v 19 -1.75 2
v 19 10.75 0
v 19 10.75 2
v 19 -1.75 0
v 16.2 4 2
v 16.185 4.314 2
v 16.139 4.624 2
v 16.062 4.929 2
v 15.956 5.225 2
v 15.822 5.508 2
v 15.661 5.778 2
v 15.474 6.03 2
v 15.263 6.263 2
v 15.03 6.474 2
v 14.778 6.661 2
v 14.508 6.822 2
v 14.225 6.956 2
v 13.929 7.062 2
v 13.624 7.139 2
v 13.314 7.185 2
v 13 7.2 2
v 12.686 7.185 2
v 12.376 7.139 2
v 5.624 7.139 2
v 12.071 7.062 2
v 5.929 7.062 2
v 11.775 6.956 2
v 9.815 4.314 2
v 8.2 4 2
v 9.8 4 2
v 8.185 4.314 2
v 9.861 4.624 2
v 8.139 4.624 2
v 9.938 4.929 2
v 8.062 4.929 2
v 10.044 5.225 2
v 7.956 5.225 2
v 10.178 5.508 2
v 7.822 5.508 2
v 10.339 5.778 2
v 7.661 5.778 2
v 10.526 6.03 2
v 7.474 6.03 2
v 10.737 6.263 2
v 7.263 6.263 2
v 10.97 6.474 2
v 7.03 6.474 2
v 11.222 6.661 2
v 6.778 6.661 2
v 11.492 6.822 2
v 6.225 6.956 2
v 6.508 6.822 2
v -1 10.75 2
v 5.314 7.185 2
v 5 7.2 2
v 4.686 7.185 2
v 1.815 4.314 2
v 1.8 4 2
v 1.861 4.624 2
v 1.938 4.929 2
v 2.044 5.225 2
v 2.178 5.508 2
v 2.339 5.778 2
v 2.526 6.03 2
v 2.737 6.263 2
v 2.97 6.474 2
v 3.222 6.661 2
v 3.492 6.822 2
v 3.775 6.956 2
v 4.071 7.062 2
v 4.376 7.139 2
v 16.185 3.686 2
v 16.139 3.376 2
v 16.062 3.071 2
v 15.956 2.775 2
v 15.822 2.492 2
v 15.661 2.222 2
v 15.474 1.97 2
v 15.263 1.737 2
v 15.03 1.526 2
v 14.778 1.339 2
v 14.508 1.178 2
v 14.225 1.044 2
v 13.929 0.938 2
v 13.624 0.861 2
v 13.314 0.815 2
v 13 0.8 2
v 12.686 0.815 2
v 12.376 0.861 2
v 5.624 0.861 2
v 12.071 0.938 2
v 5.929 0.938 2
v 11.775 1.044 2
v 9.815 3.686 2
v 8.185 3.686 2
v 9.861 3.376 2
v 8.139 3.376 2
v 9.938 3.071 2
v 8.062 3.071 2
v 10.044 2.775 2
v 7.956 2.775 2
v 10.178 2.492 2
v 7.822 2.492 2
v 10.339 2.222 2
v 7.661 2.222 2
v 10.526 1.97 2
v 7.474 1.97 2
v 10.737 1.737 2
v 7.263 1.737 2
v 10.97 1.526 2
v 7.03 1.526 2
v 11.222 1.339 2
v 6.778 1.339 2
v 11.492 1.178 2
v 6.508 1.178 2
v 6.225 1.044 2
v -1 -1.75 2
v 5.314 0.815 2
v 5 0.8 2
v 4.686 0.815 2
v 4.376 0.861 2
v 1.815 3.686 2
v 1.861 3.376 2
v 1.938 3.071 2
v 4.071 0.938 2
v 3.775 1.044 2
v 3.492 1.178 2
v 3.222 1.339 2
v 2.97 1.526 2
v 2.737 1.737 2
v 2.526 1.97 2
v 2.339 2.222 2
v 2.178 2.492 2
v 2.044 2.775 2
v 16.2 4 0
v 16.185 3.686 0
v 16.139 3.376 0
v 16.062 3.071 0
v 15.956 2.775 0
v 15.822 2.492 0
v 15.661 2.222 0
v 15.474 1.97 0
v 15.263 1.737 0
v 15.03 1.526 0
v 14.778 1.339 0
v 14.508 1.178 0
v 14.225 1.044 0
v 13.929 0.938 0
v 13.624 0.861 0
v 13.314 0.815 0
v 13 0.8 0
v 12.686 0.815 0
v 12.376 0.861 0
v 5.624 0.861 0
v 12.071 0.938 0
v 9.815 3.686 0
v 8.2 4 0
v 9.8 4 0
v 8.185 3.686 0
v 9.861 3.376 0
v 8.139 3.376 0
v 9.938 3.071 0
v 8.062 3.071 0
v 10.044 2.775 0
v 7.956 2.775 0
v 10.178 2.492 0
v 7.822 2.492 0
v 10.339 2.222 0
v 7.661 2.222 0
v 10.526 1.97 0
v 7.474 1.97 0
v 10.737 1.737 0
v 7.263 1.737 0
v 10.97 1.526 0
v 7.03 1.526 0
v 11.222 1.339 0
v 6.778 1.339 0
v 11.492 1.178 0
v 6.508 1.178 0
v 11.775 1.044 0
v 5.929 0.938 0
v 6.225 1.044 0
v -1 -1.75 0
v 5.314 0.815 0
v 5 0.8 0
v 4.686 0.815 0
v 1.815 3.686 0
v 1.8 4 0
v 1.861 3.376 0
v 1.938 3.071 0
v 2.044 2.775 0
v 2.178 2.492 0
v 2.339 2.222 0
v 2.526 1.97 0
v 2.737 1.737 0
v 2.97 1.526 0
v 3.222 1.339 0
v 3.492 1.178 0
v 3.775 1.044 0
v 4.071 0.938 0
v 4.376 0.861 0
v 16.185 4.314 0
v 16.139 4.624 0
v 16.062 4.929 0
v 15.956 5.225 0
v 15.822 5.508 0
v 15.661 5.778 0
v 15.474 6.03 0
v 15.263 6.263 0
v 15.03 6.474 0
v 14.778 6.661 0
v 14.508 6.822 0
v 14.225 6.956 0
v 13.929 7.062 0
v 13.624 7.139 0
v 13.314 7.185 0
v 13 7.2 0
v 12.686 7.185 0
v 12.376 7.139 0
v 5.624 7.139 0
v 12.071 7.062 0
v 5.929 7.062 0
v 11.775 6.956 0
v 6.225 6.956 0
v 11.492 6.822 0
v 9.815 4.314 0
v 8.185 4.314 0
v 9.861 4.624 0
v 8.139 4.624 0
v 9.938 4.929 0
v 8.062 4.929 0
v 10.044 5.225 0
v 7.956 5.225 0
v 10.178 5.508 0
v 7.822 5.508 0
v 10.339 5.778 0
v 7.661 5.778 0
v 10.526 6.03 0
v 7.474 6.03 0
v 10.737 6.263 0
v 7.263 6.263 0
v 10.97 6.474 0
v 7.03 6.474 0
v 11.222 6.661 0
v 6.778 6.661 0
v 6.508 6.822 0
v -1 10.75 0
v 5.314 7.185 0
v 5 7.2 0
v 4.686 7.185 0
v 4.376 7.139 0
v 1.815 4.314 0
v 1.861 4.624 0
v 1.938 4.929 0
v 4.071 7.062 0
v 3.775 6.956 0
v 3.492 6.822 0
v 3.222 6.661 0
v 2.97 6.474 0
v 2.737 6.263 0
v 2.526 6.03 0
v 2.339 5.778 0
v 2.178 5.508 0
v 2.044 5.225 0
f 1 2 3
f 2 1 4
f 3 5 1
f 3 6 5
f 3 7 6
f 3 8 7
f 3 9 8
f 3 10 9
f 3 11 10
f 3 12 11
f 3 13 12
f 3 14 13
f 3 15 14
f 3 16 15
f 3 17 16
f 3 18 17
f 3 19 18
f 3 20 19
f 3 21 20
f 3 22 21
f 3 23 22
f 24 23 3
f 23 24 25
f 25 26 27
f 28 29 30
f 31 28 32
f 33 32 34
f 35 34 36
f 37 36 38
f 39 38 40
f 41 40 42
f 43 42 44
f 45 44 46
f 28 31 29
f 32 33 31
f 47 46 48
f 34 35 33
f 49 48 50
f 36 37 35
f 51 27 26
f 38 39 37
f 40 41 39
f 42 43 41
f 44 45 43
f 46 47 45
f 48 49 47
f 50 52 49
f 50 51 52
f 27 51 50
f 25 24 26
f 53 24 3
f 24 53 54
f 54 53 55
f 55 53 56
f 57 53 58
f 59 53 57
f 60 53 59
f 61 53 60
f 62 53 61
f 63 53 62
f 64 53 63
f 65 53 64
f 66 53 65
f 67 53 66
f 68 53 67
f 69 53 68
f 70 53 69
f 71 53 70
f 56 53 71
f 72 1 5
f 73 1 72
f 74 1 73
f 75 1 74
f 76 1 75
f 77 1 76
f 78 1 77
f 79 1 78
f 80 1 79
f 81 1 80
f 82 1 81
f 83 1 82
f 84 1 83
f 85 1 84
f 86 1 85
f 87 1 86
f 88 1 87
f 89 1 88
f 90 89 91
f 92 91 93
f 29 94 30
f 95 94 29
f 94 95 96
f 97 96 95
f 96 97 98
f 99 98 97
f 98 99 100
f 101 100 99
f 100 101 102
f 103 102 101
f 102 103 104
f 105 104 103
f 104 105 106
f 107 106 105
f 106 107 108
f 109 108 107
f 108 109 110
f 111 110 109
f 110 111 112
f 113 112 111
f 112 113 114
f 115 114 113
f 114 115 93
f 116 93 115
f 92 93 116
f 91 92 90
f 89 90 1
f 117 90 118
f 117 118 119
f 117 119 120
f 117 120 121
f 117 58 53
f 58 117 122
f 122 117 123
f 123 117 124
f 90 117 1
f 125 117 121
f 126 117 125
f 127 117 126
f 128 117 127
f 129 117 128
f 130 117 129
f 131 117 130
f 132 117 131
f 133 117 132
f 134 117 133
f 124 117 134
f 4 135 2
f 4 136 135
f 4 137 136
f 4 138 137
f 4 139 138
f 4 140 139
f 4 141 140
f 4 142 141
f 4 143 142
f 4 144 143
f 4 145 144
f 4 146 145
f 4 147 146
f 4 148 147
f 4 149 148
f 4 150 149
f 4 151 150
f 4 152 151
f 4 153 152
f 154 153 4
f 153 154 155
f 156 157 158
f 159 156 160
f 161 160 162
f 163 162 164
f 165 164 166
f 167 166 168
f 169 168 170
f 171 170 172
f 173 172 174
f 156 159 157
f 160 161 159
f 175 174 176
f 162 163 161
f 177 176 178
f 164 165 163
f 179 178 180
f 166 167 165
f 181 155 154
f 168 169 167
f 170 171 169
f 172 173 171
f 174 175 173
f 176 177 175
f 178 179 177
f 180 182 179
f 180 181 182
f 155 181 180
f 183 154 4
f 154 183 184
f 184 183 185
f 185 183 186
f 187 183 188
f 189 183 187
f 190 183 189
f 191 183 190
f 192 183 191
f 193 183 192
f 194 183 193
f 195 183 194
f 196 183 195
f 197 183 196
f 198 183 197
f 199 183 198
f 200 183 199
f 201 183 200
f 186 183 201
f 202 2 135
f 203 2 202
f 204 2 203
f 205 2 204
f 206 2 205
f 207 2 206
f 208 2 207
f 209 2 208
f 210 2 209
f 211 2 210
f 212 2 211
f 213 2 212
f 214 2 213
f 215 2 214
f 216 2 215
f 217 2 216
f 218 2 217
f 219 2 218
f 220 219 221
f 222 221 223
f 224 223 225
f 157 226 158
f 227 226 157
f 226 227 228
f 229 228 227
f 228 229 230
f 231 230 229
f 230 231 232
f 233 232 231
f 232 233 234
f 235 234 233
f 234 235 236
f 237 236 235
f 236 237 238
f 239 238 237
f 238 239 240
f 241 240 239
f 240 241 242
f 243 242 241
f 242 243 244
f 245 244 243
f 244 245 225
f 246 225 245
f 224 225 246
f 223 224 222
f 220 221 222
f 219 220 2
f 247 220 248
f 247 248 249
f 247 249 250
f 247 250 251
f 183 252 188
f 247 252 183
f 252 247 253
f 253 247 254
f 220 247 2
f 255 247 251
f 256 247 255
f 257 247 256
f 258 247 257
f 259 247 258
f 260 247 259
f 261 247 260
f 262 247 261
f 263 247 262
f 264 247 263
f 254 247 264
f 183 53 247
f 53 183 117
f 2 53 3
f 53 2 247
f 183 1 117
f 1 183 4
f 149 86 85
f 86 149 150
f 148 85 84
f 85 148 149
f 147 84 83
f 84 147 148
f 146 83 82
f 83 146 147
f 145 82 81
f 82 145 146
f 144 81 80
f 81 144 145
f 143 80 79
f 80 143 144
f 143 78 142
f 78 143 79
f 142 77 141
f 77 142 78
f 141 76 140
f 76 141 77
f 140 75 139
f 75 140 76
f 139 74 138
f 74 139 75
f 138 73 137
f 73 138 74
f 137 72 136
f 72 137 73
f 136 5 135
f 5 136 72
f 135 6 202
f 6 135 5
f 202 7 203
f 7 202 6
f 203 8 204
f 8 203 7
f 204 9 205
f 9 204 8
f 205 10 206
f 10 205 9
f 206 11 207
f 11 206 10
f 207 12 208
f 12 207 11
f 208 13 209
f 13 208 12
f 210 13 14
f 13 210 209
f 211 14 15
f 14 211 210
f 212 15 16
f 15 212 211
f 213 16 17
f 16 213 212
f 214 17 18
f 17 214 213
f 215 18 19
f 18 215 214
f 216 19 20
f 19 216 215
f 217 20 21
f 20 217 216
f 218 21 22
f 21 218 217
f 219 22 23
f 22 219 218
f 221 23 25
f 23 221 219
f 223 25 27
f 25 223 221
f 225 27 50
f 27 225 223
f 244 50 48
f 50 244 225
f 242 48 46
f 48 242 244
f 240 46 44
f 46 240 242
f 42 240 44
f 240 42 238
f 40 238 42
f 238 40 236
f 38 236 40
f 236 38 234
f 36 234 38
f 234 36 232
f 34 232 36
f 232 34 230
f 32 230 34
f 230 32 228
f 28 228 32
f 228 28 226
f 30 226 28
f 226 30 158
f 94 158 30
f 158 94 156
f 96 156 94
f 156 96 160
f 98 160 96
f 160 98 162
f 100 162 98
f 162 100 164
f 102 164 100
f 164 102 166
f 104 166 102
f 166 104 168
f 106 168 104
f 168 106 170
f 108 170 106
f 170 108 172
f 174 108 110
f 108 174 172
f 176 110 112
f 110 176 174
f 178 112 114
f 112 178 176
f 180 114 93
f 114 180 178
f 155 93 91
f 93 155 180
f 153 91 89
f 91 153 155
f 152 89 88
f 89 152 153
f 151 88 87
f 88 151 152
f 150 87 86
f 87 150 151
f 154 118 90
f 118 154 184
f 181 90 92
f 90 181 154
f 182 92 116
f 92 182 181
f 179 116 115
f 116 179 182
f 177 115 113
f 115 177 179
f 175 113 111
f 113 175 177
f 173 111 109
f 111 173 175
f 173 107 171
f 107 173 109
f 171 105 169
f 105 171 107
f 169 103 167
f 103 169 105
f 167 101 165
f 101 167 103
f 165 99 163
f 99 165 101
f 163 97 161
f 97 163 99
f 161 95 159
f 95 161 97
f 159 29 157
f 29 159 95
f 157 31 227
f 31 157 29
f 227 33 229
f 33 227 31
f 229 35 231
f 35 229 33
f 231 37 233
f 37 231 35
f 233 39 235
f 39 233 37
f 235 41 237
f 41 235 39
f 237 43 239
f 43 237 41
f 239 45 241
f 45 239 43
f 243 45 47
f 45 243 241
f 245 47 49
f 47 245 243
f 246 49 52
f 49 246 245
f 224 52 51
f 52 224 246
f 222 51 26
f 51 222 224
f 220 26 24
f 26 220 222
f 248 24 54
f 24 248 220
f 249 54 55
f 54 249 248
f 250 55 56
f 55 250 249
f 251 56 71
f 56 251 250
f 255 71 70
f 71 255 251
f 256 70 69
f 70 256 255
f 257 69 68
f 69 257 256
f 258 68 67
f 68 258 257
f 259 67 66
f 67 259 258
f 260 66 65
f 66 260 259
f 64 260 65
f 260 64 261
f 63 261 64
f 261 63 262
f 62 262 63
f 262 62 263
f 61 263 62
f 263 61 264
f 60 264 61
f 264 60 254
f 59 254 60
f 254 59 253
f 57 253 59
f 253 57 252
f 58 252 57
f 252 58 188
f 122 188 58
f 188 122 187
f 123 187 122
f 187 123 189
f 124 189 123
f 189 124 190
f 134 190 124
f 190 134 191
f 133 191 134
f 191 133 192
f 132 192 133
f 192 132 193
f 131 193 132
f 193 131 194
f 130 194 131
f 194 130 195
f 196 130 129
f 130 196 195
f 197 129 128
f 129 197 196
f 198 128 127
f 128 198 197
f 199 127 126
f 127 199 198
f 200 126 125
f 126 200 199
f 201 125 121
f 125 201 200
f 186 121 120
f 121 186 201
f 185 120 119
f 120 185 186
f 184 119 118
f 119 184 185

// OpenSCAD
// Generated by SolidPython 1.1.3 on 2022-12-12 15:48:57


difference() {
	translate(v = [-0.0000000000, -0.0000000000]) {
		translate(v = [9.0000000000, 4.5000000000]) {
			translate(v = [0, 0, 1.0000000000]) {
				cube(center = true, size = [20, 12.5000000000, 2]);
			}
		}
	}
	linear_extrude(height = 2) {
		union() {
			translate(v = [0, 0]) {
				union() {
					translate(v = [0, 0]) {
						union() {
							translate(v = [9.0000000000, 4.0000000000, 0]) {
								rotate(a = 0) {
									union() {
										translate(v = [4, 0]) {
											circle($fn = 64, r = 3.2000000000);
										}
										translate(v = [-4, 0]) {
											circle($fn = 64, r = 3.2000000000);
										}
									}
								}
							}
						}
					}
				}
			}
		}
	}
}
/***********************************************
*********      SolidPython code:      **********
************************************************
 
import solid
import pudb
from solid.utils import *
import viewscad
import subprocess
import os
import os.path as osp
import math

chamfer_extrude=solid.import_scad("./chamfer_extrude.scad")
chamfer_extrude=chamfer_extrude.chamfer_extrude
r = viewscad.Renderer(width=800, height=800)

def debug(model,f_name,path="/home/ts/code/projects/mfd/designs/debug"):
    solid.scad_render_to_file(model,osp.join(path,f_name)+".scad")
#generate position list of wells using offset from center
wells_pos_from_center_4 = lambda offset: [[-offset,offset],
                                        [offset, offset],
                                        [-offset, -offset],
                                        [offset, -offset]]
#wells_pos_from_center_2 = lambda offset: [[0,offset],
#                                        [0, -offset]]
wells_pos_from_center_2 = lambda offset: [[offset,0],
                                        [-offset,0]]

def wells_top_bottom(radius,height=None, positions = None, dxf = False):
    if positions is None:
        offset = radius+radius/2.0
        positions = wells_pos_from_center_2(offset)
    if dxf or (height is None):
        height = 0
    wells = []
    for position in positions:
        #make circle if making dxf
        if dxf:
            well_shape = solid.circle(r=radius, segments=64)
            well_shape = solid.translate([position[0],position[1]])(well_shape)
        #if stl make cylinder
        else:
            well_shape = solid.cylinder(r=radius, h=height, segments=64, center = True)
            well_shape = solid.translate([position[0],position[1],height/2.0])(well_shape)
        wells.append(well_shape)
    return  union()(*wells)

#place wells in four corners 
def four_corner(radius,height=None, positions = None, dxf = False):
    #if well pos not specified set
    #to equally spaced by half radius
    if positions is None:
        offset = radius+radius/2.0
        positions = wells_pos_from_center_4(offset)
    if dxf or (height is None):
        height = 0
    #make wells at positions with specified radius and height
    wells = []
    for position in positions:
        #make circle if making dxf
        if dxf:
            well_shape = solid.circle(r=radius, segments=64)
            well_shape = solid.translate([position[0],position[1]])(well_shape)
        #if stl make cylinder
        else:
            well_shape = solid.cylinder(r=radius, h=height, segments=64, center = True)
            well_shape = solid.translate([position[0],position[1],height/2.0])(well_shape)
        wells.append(well_shape)
    return  union()(*wells)

#generate channels 
def make_channels(length,width,height=0,num_chans=1,max_chans=None,spacing=None, dxf = False,
                  rotate_channels=False):
    if dxf or (height is None):
        height = 0
    #if channel gap not defined, is equal to
    if spacing is None: spacing = width
    #calculate number of channels if fitting max num within given width
    if not max_chans is None:
        import math
        num_chans = math.floor((max_chans-spacing)/(width+spacing))
    #get total width of channel section  
    total_width = (width*num_chans)+(spacing*(num_chans-1))

    #make template channel
    #if rotate_channels: width, length = length, width
    if dxf:
        channel_t = solid.square([length,width],center = True)
    else:
        channel_t = solid.cube([length,width,height], center = True)

    #if number channels is even, offset the first channel to center its gap
    if num_chans % 2 == 0: centering = -(width/2.0+spacing/2.0)
    else: centering = 0
    #move template channel up to align bottom at z = 0 
    #and offset center if necessary
    if dxf:
        channel_t = solid.translate([0,centering])(channel_t)
    else:
        channel_t = solid.translate([0,centering,height/2.0])(channel_t)

    #if rotate_channels: length,width = width,length
    #start making the channels
    channels = []
    for i in range(num_chans):
        #if i=0 there is no translation
        #if i=1, we make the first channel adjacent to second
        direction = i

        #if i>=1, we add channels alternating left and right
        if i >= 1:
            direction = -(i/2.0)
            if i % 2 == 1: direction = (-direction)+0.5
                
        #make channel at right position and add it to channel list
        translation_coords = [0,direction*(width+spacing)]
        #if rotate_channels: translation_coords = [direction*(width+spacing),0]
        if dxf:
            channel = solid.translate(translation_coords)(channel_t)
        else:
            channel = solid.translate([*translation_coords,0])(channel_t)
        channels.append(channel)
    
    #group all channels as one object
    channels = union()(*channels)
    #compute the x,y,z dimensions in order to pass as arguments 
    #for construction of other parts of device (such as the chambers)
    measurements = {'x':(length/2.0,-length/2.0),
                    'y':(total_width/2.0,-total_width/2.0)}
    if not dxf:
        measurements['z'] = (height,0)
    if rotate_channels:
        channels = solid.rotate(90)(channels)
        measurements['x'],measurements['y']=measurements['y'],measurements['x']
    return channels,measurements

def make_chambers(msrs,height=None,extra=0,len_until=None,width=None, dxf = False):
    #computes x,y,z length
    total = lambda x : abs(x[0]) + abs(x[1])
    
    #if specific height if specified
    #otherwise use same height as channels
    if dxf:
        pass
    elif not height is None:
        msrs['z'] = (height,0)
    else:
        msrs['z'] = (0,0)
        
    #make copy of measurements from channels to modify chamber dimensions 
    #and add length to chambers as specified
    chamber_dims = msrs.copy()
    #calculate length of chamber to reach specified offset
    if not len_until is None:
        chamber_len = len_until-(msrs['x'][0])
    #or add specified length to channel length (if not specified, adds 0)
    else:
        chamber_len = msrs['x'][0]+extra
    #set the chamber length based 
    chamber_dims['x'] = (chamber_len/2.0,-(chamber_len/2.0))
    #compute final dimensions of chamber
    if not width is None:
        chamber_dims['y'] = (width/2.0,-width/2.0)
    chamber_dims = [total(size) for size in chamber_dims.values()]
        
    #calculate chamber translation offset to place adjacent to channels
    chamber_trslt = msrs['x'][0]+(chamber_len/2.0)
    #compute chamber translation coordinates to align with channels
    #x = 1 moves chamber above channels
    #x = -1 moves chamber below channels
    if dxf:
        trslt = lambda x : [x*(chamber_trslt),0]
    else:
        trslt = lambda x : [x*(chamber_trslt),0,msrs['z'][0]/2.0]
    
    #function to make chamber at top or at bottom 
    if dxf:
        move = lambda x : solid.translate(trslt(x))(solid.square(chamber_dims, center = True) )
    else:
        move = lambda x : solid.translate(trslt(x))(solid.cube(chamber_dims,center = True))
    #make top and bottom chambers and return them as grouped
    top = move(1)
    bottom = move(-1)
    #chambers=solid.rotate(90)(solid.union()(top,bottom))
    chambers=(solid.union()(top,bottom))

    return chambers

#create alignment features 
def alignment_features(unit,dims,grid_size, mask_size = None, alignment = "hollow", units_from_center = (2.5,2.5), corner_len=None):
    width = grid_size[0]*dims[0]
    length = grid_size[1]*dims[1]
    if mask_size is None and corner_len is None:
        corner_len = (dims[0] + dims[1]) /2 / 8
    corner = lambda thickness_div : solid.union()( solid.square([corner_len,corner_len/thickness_div],center=False), solid.square([corner_len/thickness_div,corner_len],center=False) )
    
    def make_full(thickness_div):
        thickness = corner_len/thickness_div
        tr = solid.translate([0, 0, 0 ])(solid.rotate(180)(corner(thickness_div)))
        tr = solid.translate([thickness/2,thickness/2,0])(tr)
        bl = solid.translate([0, 0, 0 ])(solid.rotate(0)(corner(thickness_div)))
        bl = solid.translate([-thickness/2,-thickness/2,0])(bl)
        return solid.union()(tr,bl)
    
    def make_hollow(thickness_div):
        thickness = corner_len/(thickness_div/2)
        inner = make_full(thickness_div)
        outer = make_full(thickness_div/2)
        hollow = outer - inner 
        return hollow
    
    center = (width /2 , length/2)
    mask_pos = lambda x,y : (center[0] + x*(float(units_from_center[0])*dims[0]), center[1] + y*(float(units_from_center[1])*dims[1]))
    positions = []
    positions.append(mask_pos(1,0))
    positions.append(mask_pos(0,1))
    positions.append(mask_pos(-1,0))
    positions.append(mask_pos(0,-1))
    make_mask = lambda mtype : make_hollow(8) if mtype == "hollow" else make_full(8)
    masks = [ solid.translate([*position,0])(make_mask(alignment)) for position in positions]
    
    solid.scad_render_to_file(solid.union()(*masks),"./designs/open_chamber/masks.scad")
    #return unit - solid.union()(*masks)
    return solid.union()(*masks,unit)

def create_outline(thickness, array, dims, grid_size,):
    width = grid_size[0]*dims[0] + thickness *2
    length = grid_size[1]*dims[1] + thickness *2
    outer = solid.translate([-thickness, -thickness,0])(solid.square([width, length]))
    return outer-array

def create_wall(wall_thickness, outline_thickness, dims, grid_size, wall_height = 2000, dxf = False):
    inner_width = grid_size[0]*dims[0] + outline_thickness *2
    inner_length = grid_size[1]*dims[1] + outline_thickness *2
    outer_width = inner_width + wall_thickness * 2
    outer_length = inner_length + wall_thickness * 2
    outer_pos_x = -outline_thickness-wall_thickness
    outer_pos_y = -outline_thickness-wall_thickness
    inner_pos_x = -outline_thickness
    inner_pos_y = -outline_thickness
    if dxf:
        inner_wall = solid.translate([inner_pos_x,
                                      inner_pos_y,
                                      0])(solid.square([inner_width, inner_length]))
        outer_wall = solid.translate([outer_pos_x,
                                      outer_pos_y,
                                      0])(solid.square([outer_width, outer_length]))

        return outer_wall-inner_wall
    else:
        inner_wall = solid.translate([inner_pos_x,
                                      inner_pos_y,
                                      0])(solid.cube([inner_width, inner_length,wall_height]))
        outer_wall = solid.translate([outer_pos_x,
                                      outer_pos_y,
                                      0])(solid.cube([outer_width, outer_length,wall_height]))

        return outer_wall-inner_wall, {'wall_height': wall_height,
                                       'wall_thickness': wall_thickness,
                                       'inner_width':inner_width,
                                       'inner_length': inner_length,
                                       'outer_width': outer_width,
                                       'outer_length': outer_length,
                                       'outer_pos_x' : outer_pos_x,
                                       'outer_pos_y' : outer_pos_y,
                                       'inner_pos_x' : inner_pos_x,
                                       'inner_pos_y' : inner_pos_y}

def create_thicker_wall(wall_thickness, outer_wall_offset, wall_dims, dims, grid_size, height_start = .2, height_end=2, dxf = False):
    addon_wall,thicker_wall_dims = create_wall(wall_thickness, outer_wall_offset, dims, grid_size, wall_height=height_end-height_start, dxf = False)
    addon_wall = solid.translate([0,0,height_start])(addon_wall)

    thicker_wall_dims['wall_height'] = height_end
    thicker_wall_dims['wall_thickness'] = wall_dims['wall_thickness'] + wall_thickness
    return addon_wall, thicker_wall_dims
 
def add_lock_to_wall(wall,wall_dims,y_offset = 0,cut_ratio=0.7,L_length=3, gap_ratio=0.05, axis="x",width_ratio=1/2):
    # Makes L shape
    def make_L(max_length,length_thickness,max_width,width_thickness,height,y_offset):
        length = solid.cube([max_length,length_thickness,height])
        width = solid.cube([width_thickness,max_width,height])
        width = solid.translate([max_length-(width_thickness),0,0])(width)
        L = solid.union()(width,length)
        debug(L,"L")
        if axis == "x":
            L = solid.rotate(-90)(L)
            L = solid.translate([0,max_length,0])(L)
        else:
            L = solid.rotate(-180)(L)
            L = solid.translate([max_length,max_width,0])(L)
        return solid.translate([0,0,y_offset])(L)
    
    lock_length = L_length
    lock_width = wall_dims['wall_thickness']*width_ratio
    lock_length_thickness = lock_width/2
    lock_width_thickness = lock_width/2
    L_lock = make_L(lock_length,lock_length_thickness,lock_width,lock_width_thickness, wall_dims['wall_height']-y_offset, y_offset)
    
    margin_space = lock_length - lock_length*(1-gap_ratio)
    key_length = lock_length-margin_space
    key_length_thickness = lock_length_thickness-(margin_space*2)
    key_width = lock_width-(margin_space*2)
    key_width_thickness = lock_width_thickness-(margin_space*2)
    L_key = make_L(key_length,key_length_thickness,key_width,key_width_thickness, wall_dims['wall_height']-y_offset, y_offset)
    L_key = solid.translate([margin_space,margin_space,0])(L_key)
    L = solid.union()(L_lock,L_key)
    debug(L,"L")
    
    #Make cube to be used as negative to split frame in a half
    #Can choose if making left or right negative, specify ratio of split
    def make_negative(right,cut_ratio):
        if axis == "x":
            if right:
                length = wall_dims['outer_length']*(1-cut_ratio)
                pos_x = wall_dims['outer_pos_x']+(wall_dims['outer_length']*cut_ratio)
            else:
                length = wall_dims['outer_length']*(cut_ratio)
                pos_x = wall_dims['outer_pos_x'] 
            negative = solid.cube([wall_dims['outer_width'],length, wall_dims['wall_height']])
            negative = solid.translate([wall_dims['outer_pos_y'],pos_x,0])(negative)
        else:
            if right:
                length = wall_dims['outer_width']*(1-cut_ratio)
                pos_x = wall_dims['outer_pos_y']+(wall_dims['outer_width']*cut_ratio)
            else:
                length = wall_dims['outer_width']*(cut_ratio)
                pos_x = wall_dims['outer_pos_y'] 
            negative = solid.cube([length,wall_dims['outer_length'], wall_dims['wall_height']])
            negative = solid.translate([pos_x,wall_dims['outer_pos_x'],0])(negative)
        return negative, pos_x, length 
                      
    #Make negatives
    negative_right, right_half_pos_x, right_half_length = make_negative(True,cut_ratio)
    negative_left, left_half_pos_x, right_half_length = make_negative(False,cut_ratio)
    #Make halves
    left_half = solid.difference()(wall,negative_right)
    right_half = solid.difference()(wall,negative_left)
    def place_L(L, L_length,L_width):
        #Place L on top wall       
        offset_to_center = (wall_dims['wall_thickness']-L_width)/2
        if axis == "x":
            y_pos_top = (wall_dims['outer_pos_y'] +
                    wall_dims['outer_width'] - 
                    L_width - offset_to_center)
            top_L = solid.translate([y_pos_top,
                                     right_half_pos_x-(L_length),
                                     0])(L)
            #Place L on bottom wall       
            y_pos_bottom = wall_dims['outer_pos_y']+offset_to_center
            bottom_L = solid.translate([y_pos_bottom,
                                        right_half_pos_x-L_length,
                                        0])(L)
        else:
            y_pos_top = (wall_dims['outer_pos_x'] +
                    wall_dims['outer_length'] -
                    (L_width+offset_to_center))
            top_L = solid.translate([right_half_pos_x-L_length,
                                     y_pos_top,
                                     0])(L)
            #Place L on bottom wall       
            y_pos_bottom = wall_dims['outer_pos_y']+offset_to_center
            bottom_L = solid.translate([right_half_pos_x-L_length,
                                        y_pos_bottom,
                                        0])(L)
        return bottom_L, top_L
    #Make complimentary L pieces through union and differences
    #Make Lock
    bottom_L_lock, top_L_lock = place_L(L_lock,L_length,lock_width)
    left_half = solid.difference()(left_half,bottom_L_lock)
    left_half = solid.difference()(left_half,top_L_lock)
    #Make Key
    bottom_L_key, top_L_key = place_L(L_key,L_length,lock_width)
    right_half = solid.union()(right_half,bottom_L_key)
    right_half = solid.union()(right_half,top_L_key)
    return left_half, right_half


#build a row x col grid of containment units
def make_unit_array(unit,dims,grid_size, dxf = False, alignment = None, mask_size = None,
                    units_from_center = None,alignment_offset=None, alignment_mark_size=1):
    units = []
    for col in range(grid_size[1]):
        for row in range(grid_size[0]):
            if dxf:
                units.append(solid.translate([row*dims[0],col*dims[1]])(unit))
            else:
                units.append(solid.translate([row*dims[0],col*dims[1],dims[2]/2.0])(unit))
    array = solid.union()(*units)
    if (not alignment is None) and dxf:
        if not alignment_offset is None:
            array = solid.translate([alignment_offset[0],alignment_offset[1]])(array)
        array = alignment_features(array,dims, grid_size, alignment = alignment, mask_size = None, units_from_center = units_from_center,corner_len=alignment_mark_size)
        if not alignment_offset is None:
            array = solid.translate([-alignment_offset[0],-alignment_offset[1]])(array)
    return array


def make_taylor(wells_pos = wells_pos_from_center_4(2.25), well_rad = 1.5 ,
                well_height = 2, chan_w = 0.01, chan_l = 1, chan_h = 0.010 ,
                chan_gap = 0.040, max_chans = None,num_chans=100, chamber_height  = 0.100,
                columns = 1, rows = 1, chamber_len_until=2.25, add_channels = True, add_wells = True, 
                add_chambers = True, save_path = "./", alignment = None, units_from_center = 2,
                mask_size = None, render_stl = False, outline_thickness = 0.050, dxf = True,
                wall_height = 15, wall_thickness = 0.95, casing_x=9, casing_y=9, casing_z=0,rotate_units=0):

    dims = [casing_x, casing_y, casing_z]
    wells = four_corner(well_rad,well_height, dxf = dxf, positions = wells_pos)
    debug(wells,"wells")
    channels, msrs = make_channels(chan_l,chan_w,chan_h,dxf=dxf, spacing = chan_gap, max_chans=max_chans,num_chans=num_chans)
    debug(channels,"channels")
    chambers = make_chambers(msrs,dxf = dxf, height=chamber_height,len_until=chamber_len_until)
    debug(chambers,"chambers")

    #add together and render
    device_parts = []
    if add_channels:
        device_parts.append(channels)
    if add_wells:
        device_parts.append(wells)
    if add_chambers:
        device_parts.append(chambers)
    device=union()(*device_parts)
    device = rotate(rotate_units)(device)

    device=solid.translate([dims[0]/2.0,dims[1]/2.0,0])(device)
    channels = rotate(rotate_units)(channels)
    channels=solid.translate([dims[0]/2,dims[1]/2,0])(channels)
    chambers_wells = union()(wells,chambers)
    chambers_wells = rotate(rotate_units)(chambers_wells)
    chambers_wells=solid.translate([dims[0]/2,dims[1]/2,0])(chambers_wells)

    file_name = str(rows)+'x'+str(columns)+'_units_'
    grid_size = [rows,columns]

    if alignment:
        alignment="full"
    device = make_unit_array(device,dims,grid_size, dxf=dxf, alignment = alignment,
                                 units_from_center = units_from_center)
    channels = make_unit_array(channels,dims,grid_size, dxf=dxf, alignment = alignment,
                                 units_from_center = units_from_center)
    if alignment=="full":
        alignment="hollow"

    chambers_wells = make_unit_array(chambers_wells,dims,grid_size, dxf=dxf, alignment = alignment,
                                 units_from_center =units_from_center)

    def save_model(model,prefix):
        model_fname = os.path.abspath(save_path+prefix+"_"+file_name+".scad")
        solid.scad_render_to_file(model,model_fname)
        return model_fname

    wells_fname = save_model(wells,"wells")
    channels_fname = save_model(channels,"channels")
    device_fname = save_model(device,"device")
    chambers_wells_fname = save_model(chambers_wells,"chambers_wells")
    return (chambers_wells,chambers_wells_fname), (channels,channels_fname), (device,device_fname)

def make_device(design='open',rows=8,columns=6,wells_pos = 4.5, well_rad=3.2,well_height=0.1,
                chan_l=1,chan_w=0.01,chan_h=0.01,chan_gap=0.015,num_chans=101,dxf=True,save_path="./designs/open_chamber/",
                casing_x=9.0,casing_y=18.0,casing_z=0,rotate_units=90,units_from_center=(3,1),chamber_len_until=4.5,
                chamber_width=None,alignment=True, add_wells=True, add_channels=True,add_chambers=True):

    dims = [casing_x, casing_y, casing_z]
    if design == "open":
        wells_pos=wells_pos_from_center_2(wells_pos)
        wells = wells_top_bottom(well_rad,height=well_height, dxf = dxf, positions = wells_pos)
    elif design == "closed":
        wells_pos=wells_pos_from_center_4(wells_pos)
        wells = four_corner(well_rad,well_height, dxf = dxf, positions = wells_pos)
    else:
        print(design+" is not a valid design.\n Choose valid design: 'open' or 'closed'")
        exit()
    wells = rotate(rotate_units)(wells)
    wells=solid.translate([dims[0]/2,dims[1]/2,0])(wells)



    channels, msrs = make_channels(chan_l,chan_w,chan_h,dxf=dxf, spacing = chan_gap, num_chans=num_chans,rotate_channels=False)
    channels = rotate(rotate_units)(channels)
    channels=solid.translate([dims[0]/2,dims[1]/2,0])(channels)

    chambers=make_chambers(msrs,height=None,extra=0,len_until=chamber_len_until, width=chamber_width,dxf = dxf)
    chambers = rotate(rotate_units)(chambers)
    chambers=solid.translate([dims[0]/2,dims[1]/2,0])(chambers)

    device_parts = []
    if add_channels:
        device_parts.append(channels)
    if add_wells:
        device_parts.append(wells)
    if add_chambers:
        device_parts.append(chambers)
    device = union()(*device_parts)
    #device = rotate(rotate_units)(device)
    #device=solid.translate([dims[0]/2.0,dims[1]/2.0,0])(device)

    chambers_wells = []
    if add_chambers:
        chambers_wells.append(chambers)
    if add_wells:
        chambers_wells.append(wells)
    chambers_wells = union()(*chambers_wells)
    #chambers_wells = union()(wells,chambers)
    #chambers_wells = rotate(rotate_units)(chambers_wells)
    #chambers_wells=solid.translate([dims[0]/2,dims[1]/2,0])(chambers_wells)

    file_name = str(rows)+'x'+str(columns)+'_units_'

    grid_size = [rows,columns]
    if alignment:
        alignment="full"
    device = make_unit_array(device,dims,grid_size, dxf=dxf, alignment = alignment,
                                 units_from_center = units_from_center)
    channels = make_unit_array(channels,dims,grid_size, dxf=dxf, alignment = alignment,
                                 units_from_center = units_from_center)
    if alignment=="full":
        alignment="hollow"

    chambers_wells = make_unit_array(chambers_wells,dims,grid_size, dxf=dxf, alignment = alignment,
                                 units_from_center =units_from_center)

    def save_model(model,prefix):
        model_fname = os.path.abspath(save_path+prefix+"_"+file_name+".scad")
        solid.scad_render_to_file(model,model_fname)
        return model_fname

    wells_fname = save_model(wells,"wells")
    channels_fname = save_model(channels,"channels")
    device_fname = save_model(device,"device")
    chambers_wells_fname = save_model(chambers_wells,"chambers_wells")
    return (chambers_wells,chambers_wells_fname), (channels,channels_fname), (device,device_fname)


def make_open_chamber(rows=8,columns=6,wells_pos = wells_pos_from_center_2(4.5), well_rad=3.2,well_height=0.1,
                      chan_l=1,chan_w=0.01,chan_h=0.01,chan_gap=0.015,num_chans=101,dxf=True,save_path="./designs/open_chamber/",
                      casing_x=9.0,casing_y=18.0,casing_z=0,rotate_units=90,units_from_center=(3,1),chamber_len_until=4.5,
                      chamber_width=None,alignment=True, add_wells=True, add_channels=True,add_chambers=True):

    dims = [casing_x, casing_y, casing_z]
    wells = wells_top_bottom(well_rad,height=well_height, dxf = dxf, positions = wells_pos)
    channels, msrs = make_channels(chan_l,chan_w,chan_h,dxf=dxf, spacing = chan_gap, num_chans=num_chans,rotate_channels=False)
    chambers=make_chambers(msrs,height=None,extra=0,len_until=chamber_len_until, width=chamber_width,dxf = dxf)
    debug(chambers,"chambers")
    device_parts = []
    if add_channels:
        device_parts.append(channels)
    if add_wells:
        device_parts.append(wells)
    if add_chambers:
        device_parts.append(chambers)
    device = union()(*device_parts)
    device = rotate(rotate_units)(device)
    device=solid.translate([dims[0]/2.0,dims[1]/2.0,0])(device)
    channels = rotate(rotate_units)(channels)
    channels=solid.translate([dims[0]/2,dims[1]/2,0])(channels)
    chambers_wells = union()(wells,chambers)
    chambers_wells = rotate(rotate_units)(chambers_wells)
    chambers_wells=solid.translate([dims[0]/2,dims[1]/2,0])(chambers_wells)

    file_name = str(rows)+'x'+str(columns)+'_units_'

    grid_size = [rows,columns]
    if alignment:
        alignment="full"
    device = make_unit_array(device,dims,grid_size, dxf=dxf, alignment = alignment,
                                 units_from_center = units_from_center)
    channels = make_unit_array(channels,dims,grid_size, dxf=dxf, alignment = alignment,
                                 units_from_center = units_from_center)
    if alignment=="full":
        alignment="hollow"

    chambers_wells = make_unit_array(chambers_wells,dims,grid_size, dxf=dxf, alignment = alignment,
                                 units_from_center =units_from_center)

    def save_model(model,prefix):
        model_fname = os.path.abspath(save_path+prefix+"_"+file_name+".scad")
        solid.scad_render_to_file(model,model_fname)
        return model_fname

    wells_fname = save_model(wells,"wells")
    channels_fname = save_model(channels,"channels")
    device_fname = save_model(device,"device")
    chambers_wells_fname = save_model(chambers_wells,"chambers_wells")
    return (chambers_wells,chambers_wells_fname), (channels,channels_fname), (device,device_fname)

def to_dxf(scad_path):
    dxf_path = scad_path.replace(".scad",".dxf")
    subprocess.call(["openscad", "-o", dxf_path, scad_path])
    import ezdxf
    temp_dxf = ezdxf.readfile(dxf_path)
    temp_dxf.saveas(dxf_path)

#def make_walls(diameter,thickness,grid_size,dims,height=20,segments=256,make_inner=True):
#    wafer_wall_out = solid.cylinder(r=diameter/2,h=height, segments=segments)
#    wafer_wall_in = solid.cylinder(r=(diameter/2-thickness),h=height, segments=segments)
#    wafer_wall = solid.difference()(wafer_wall_out,wafer_wall_in)
#    wafer_wall = solid.translate([grid_size[1]*dims[1]/2.0,grid_size[0]*dims[0]/2.0])(wafer_wall)
#
#    vertical_wall_length = grid_size[1]*dims[1]
#    horizontal_wall_length = grid_size[0]*dims[0]
#    vertical_wall = solid.cube([vertical_wall_length,thickness,height],center = True)
#    vertical_wall = solid.translate([vertical_wall_length/2,0,height/2])(vertical_wall)
#    horizontal_wall = solid.cube([thickness,horizontal_wall_length,height],center = True)
#    horizontal_wall = solid.translate([0,vertical_wall_length/2,height/2])(horizontal_wall)
#    walls = []
#    walls.append(horizontal_wall)
#    walls.append(vertical_wall)
#    for col in range(grid_size[1]):
#        if col == grid_size[1]-1: 
#            walls.append(solid.translate([0,(col+1)*dims[1]])(vertical_wall))
#        elif col > 0 and col < grid_size[1]-1 and make_inner==True:
#            walls.append(solid.translate([0,(col+1)*dims[1]])(vertical_wall))
#    for row in range(grid_size[0]):
#        if row == grid_size[0]-1: 
#            walls.append(solid.translate([(row+1)*dims[0],0])(horizontal_wall))
#        elif row > 0 and row < grid_size[0]-1 and make_inner==True:
#            walls.append(solid.translate([(row+1)*dims[0],0])(horizontal_wall))
#    walls = union()(*walls)
#    wafer_walls = union()(walls,wafer_wall)
#    return walls,wafer_wall,wafer_walls

def make_walls(diameter,thickness,grid_size,dims,height=20,segments=256,make_inner=True,padx=0,pady=0):
    wafer_wall_out = solid.cylinder(r=diameter/2,h=height, segments=segments)
    wafer_wall_in = solid.cylinder(r=(diameter/2-thickness),h=height, segments=segments)
    wafer_wall = solid.difference()(wafer_wall_out,wafer_wall_in)
    wafer_wall = solid.translate([grid_size[1]*dims[1]/2.0,grid_size[0]*dims[0]/2.0])(wafer_wall)

    vertical_wall_length = grid_size[0]*dims[0]+padx
    horizontal_wall_length = grid_size[1]*dims[1]+pady
    vertical_wall = solid.cube([vertical_wall_length,thickness,height],center = True)
    vertical_wall = solid.translate([vertical_wall_length/2-pady/2,-padx/2,height/2])(vertical_wall)
    horizontal_wall = solid.cube([thickness,horizontal_wall_length,height],center = True)
    horizontal_wall = solid.translate([-pady/2,horizontal_wall_length/2-padx/2,height/2])(horizontal_wall)
    walls = []
    walls.append(horizontal_wall)
    walls.append(vertical_wall)
    for col in range(grid_size[1]):
        if col == grid_size[1]-1: 
            walls.append(solid.translate([0,(col+1)*dims[1]+pady])(vertical_wall))
        elif col > 0 and col < grid_size[1]-1 and make_inner==True:
            walls.append(solid.translate([0,(col+1)*dims[1]])(vertical_wall))
    for row in range(grid_size[0]):
        if row == grid_size[0]-1: 
            walls.append(solid.translate([(row+1)*dims[0]+padx,0])(horizontal_wall))
        elif row > 0 and row < grid_size[0]-1 and make_inner==True:
            walls.append(solid.translate([(row+1)*dims[0],0])(horizontal_wall))
    walls = union()(*walls)
    wafer_walls = union()(walls,wafer_wall)
    return walls,wafer_wall,wafer_walls

def save_model(model,base_path,base_name,dxf=True):
    if not os.path.exists(base_path):
        os.makedirs(base_path)
    dxf_path=osp.join(base_path,base_name+".scad")
    solid.scad_render_to_file(model,osp.join(dxf_path))
    if dxf:
        to_dxf(dxf_path)

def make_wafer(diameter,flat_len,thickness):
    wafer = solid.cylinder(r1=diameter/2,r2=diameter/2,h=thickness,segments=512,)()
    x_start_flat=(flat_len/2)
    y_start_flat = math.sqrt(((diameter/2)**2) - (x_start_flat**2) )
    height_delete_flat=diameter/2-y_start_flat
    flat_delete = solid.cube([flat_len,height_delete_flat,thickness],center=False)()
    flat_delete = solid.translate([-flat_len/2,y_start_flat,0])(flat_delete)
    wafer = solid.difference()(wafer,flat_delete)
    wafer = solid.rotate(90)(wafer)
    return wafer

def add_wafer_to_mask(wafer_size,flat_len,mask,grid_size,dims,wafer_line_thickness=0.1,outer_mask_thickness=5,alignment_offset=None):
    def make_wafer_mask(wafer_size,flat_len):
        wafer_mask = make_wafer(wafer_size,flat_len,1)
        wafer_mask = solid.projection()(wafer_mask)
        wafer_mask = solid.translate([grid_size[0]*dims[0]/2.0,grid_size[1]*dims[1]/2.0])(wafer_mask)
        if not alignment_offset is None:
            wafer_mask = solid.translate([-alignment_offset[0],-alignment_offset[1]])(wafer_mask)
        return wafer_mask

    inner_wafer_line_mask = make_wafer_mask(wafer_size-wafer_line_thickness/2,flat_len)
    outer_wafer_line_mask = make_wafer_mask(wafer_size+wafer_line_thickness/2,flat_len)
    outer_wafer_mask = make_wafer_mask(wafer_size+outer_mask_thickness,flat_len)
    outer_wafer_mask = solid.difference()(outer_wafer_mask,outer_wafer_line_mask)
    wafer_mask = solid.union()(outer_wafer_mask,inner_wafer_line_mask)

    return solid.difference()(wafer_mask,mask)

def make_posts(post_shape,post_height):
    posts = solid.linear_extrude(height=post_height)(post_shape)
    return posts

def make_wafer_empty(diameter,flat_len,thickness,margin,notch_len=20,notch_height=5,oversize=1.01):
    diameter*=oversize
    flat_len*=oversize
    wafer = make_wafer(diameter,flat_len,thickness)
    holder = solid.cylinder(r1=diameter/2+margin,r2=diameter/2+margin,h=thickness,segments=512)()
    holder = solid.difference()(holder,wafer)

    x_start_flat=(flat_len/2)
    y_start_flat = math.sqrt(((diameter/2)**2) - (x_start_flat**2) )
    height_delete_flat=diameter/2-y_start_flat
    notch = solid.cube([notch_len,notch_height,thickness],center=False)()
    notch = solid.translate([-notch_len/2,y_start_flat,0])(notch)
    notch = solid.rotate(90)(notch)
    return solid.difference()(holder,notch)

def wafer_print_calibration(diameter,thickness,height,z_offset):
    circles = []
    radii = []
    radii.append(diameter/2.0*0.8)
    radii.append(diameter/2.0*0.6)
    radii.append(diameter/2.0*0.4)
    radii.append(diameter/2.0*0.2)
    for radius in radii:
        inner = solid.cylinder(r1=radius-(thickness/2.0),r2=radius-(thickness/2.0),h=thickness,segments=512,)()
        outer = solid.cylinder(r1=radius+(thickness/2.0),r2=radius+(thickness/2.0),h=thickness,segments=512,)()
        diff = solid.difference()(outer,inner)
        circles.append(diff)
    circles = solid.union()(*circles)
    circles = solid.translate([0,0,z_offset])(circles)
    return circles

def make_rack(wells,dims,grid_size,alignment_offset,rack_x,rack_y,rack_thickness,bolt_width,add_bolts=True):

    #get X and Y dimensions of gride of pipette tips
    X_len = dims[0]*grid_size[0]
    Y_len = dims[1]*grid_size[1]
    #make rack
    rack = solid.cube([rack_x,rack_y,rack_thickness],center=True)

    if add_bolts:
    #add bolt holes
        bolt_hole=solid.cylinder(r=bolt_width/2,h=rack_thickness,center=True)()
        bolt_holes = []
        bolt_holes.append(solid.translate([rack_x/2-1.5*bolt_width,rack_y/2-1.5*bolt_width])(bolt_hole))
        bolt_holes.append(solid.translate([-rack_x/2+1.5*bolt_width,rack_y/2-1.5*bolt_width])(bolt_hole))
        bolt_holes.append(solid.translate([-rack_x/2+1.5*bolt_width,-rack_y/2+1.5*bolt_width])(bolt_hole))
        bolt_holes.append(solid.translate([rack_x/2-1.5*bolt_width,-rack_y/2+1.5*bolt_width])(bolt_hole))
        bolt_holes = solid.union()(*bolt_holes)
        rack=solid.difference()(rack,bolt_holes)
    rack_support = rack

    #center rack with pipette holes
    rack = solid.translate([0,0,rack_thickness/2])(rack)
    rack = solid.translate([X_len/2,Y_len/2])(rack)
    rack = solid.translate([-alignment_offset[0],-alignment_offset[1]])(rack)
    wells = solid.linear_extrude(height=rack_thickness)(wells)
    rack = solid.difference()(rack,wells)
    return rack, rack_support





 
 
************************************************/
